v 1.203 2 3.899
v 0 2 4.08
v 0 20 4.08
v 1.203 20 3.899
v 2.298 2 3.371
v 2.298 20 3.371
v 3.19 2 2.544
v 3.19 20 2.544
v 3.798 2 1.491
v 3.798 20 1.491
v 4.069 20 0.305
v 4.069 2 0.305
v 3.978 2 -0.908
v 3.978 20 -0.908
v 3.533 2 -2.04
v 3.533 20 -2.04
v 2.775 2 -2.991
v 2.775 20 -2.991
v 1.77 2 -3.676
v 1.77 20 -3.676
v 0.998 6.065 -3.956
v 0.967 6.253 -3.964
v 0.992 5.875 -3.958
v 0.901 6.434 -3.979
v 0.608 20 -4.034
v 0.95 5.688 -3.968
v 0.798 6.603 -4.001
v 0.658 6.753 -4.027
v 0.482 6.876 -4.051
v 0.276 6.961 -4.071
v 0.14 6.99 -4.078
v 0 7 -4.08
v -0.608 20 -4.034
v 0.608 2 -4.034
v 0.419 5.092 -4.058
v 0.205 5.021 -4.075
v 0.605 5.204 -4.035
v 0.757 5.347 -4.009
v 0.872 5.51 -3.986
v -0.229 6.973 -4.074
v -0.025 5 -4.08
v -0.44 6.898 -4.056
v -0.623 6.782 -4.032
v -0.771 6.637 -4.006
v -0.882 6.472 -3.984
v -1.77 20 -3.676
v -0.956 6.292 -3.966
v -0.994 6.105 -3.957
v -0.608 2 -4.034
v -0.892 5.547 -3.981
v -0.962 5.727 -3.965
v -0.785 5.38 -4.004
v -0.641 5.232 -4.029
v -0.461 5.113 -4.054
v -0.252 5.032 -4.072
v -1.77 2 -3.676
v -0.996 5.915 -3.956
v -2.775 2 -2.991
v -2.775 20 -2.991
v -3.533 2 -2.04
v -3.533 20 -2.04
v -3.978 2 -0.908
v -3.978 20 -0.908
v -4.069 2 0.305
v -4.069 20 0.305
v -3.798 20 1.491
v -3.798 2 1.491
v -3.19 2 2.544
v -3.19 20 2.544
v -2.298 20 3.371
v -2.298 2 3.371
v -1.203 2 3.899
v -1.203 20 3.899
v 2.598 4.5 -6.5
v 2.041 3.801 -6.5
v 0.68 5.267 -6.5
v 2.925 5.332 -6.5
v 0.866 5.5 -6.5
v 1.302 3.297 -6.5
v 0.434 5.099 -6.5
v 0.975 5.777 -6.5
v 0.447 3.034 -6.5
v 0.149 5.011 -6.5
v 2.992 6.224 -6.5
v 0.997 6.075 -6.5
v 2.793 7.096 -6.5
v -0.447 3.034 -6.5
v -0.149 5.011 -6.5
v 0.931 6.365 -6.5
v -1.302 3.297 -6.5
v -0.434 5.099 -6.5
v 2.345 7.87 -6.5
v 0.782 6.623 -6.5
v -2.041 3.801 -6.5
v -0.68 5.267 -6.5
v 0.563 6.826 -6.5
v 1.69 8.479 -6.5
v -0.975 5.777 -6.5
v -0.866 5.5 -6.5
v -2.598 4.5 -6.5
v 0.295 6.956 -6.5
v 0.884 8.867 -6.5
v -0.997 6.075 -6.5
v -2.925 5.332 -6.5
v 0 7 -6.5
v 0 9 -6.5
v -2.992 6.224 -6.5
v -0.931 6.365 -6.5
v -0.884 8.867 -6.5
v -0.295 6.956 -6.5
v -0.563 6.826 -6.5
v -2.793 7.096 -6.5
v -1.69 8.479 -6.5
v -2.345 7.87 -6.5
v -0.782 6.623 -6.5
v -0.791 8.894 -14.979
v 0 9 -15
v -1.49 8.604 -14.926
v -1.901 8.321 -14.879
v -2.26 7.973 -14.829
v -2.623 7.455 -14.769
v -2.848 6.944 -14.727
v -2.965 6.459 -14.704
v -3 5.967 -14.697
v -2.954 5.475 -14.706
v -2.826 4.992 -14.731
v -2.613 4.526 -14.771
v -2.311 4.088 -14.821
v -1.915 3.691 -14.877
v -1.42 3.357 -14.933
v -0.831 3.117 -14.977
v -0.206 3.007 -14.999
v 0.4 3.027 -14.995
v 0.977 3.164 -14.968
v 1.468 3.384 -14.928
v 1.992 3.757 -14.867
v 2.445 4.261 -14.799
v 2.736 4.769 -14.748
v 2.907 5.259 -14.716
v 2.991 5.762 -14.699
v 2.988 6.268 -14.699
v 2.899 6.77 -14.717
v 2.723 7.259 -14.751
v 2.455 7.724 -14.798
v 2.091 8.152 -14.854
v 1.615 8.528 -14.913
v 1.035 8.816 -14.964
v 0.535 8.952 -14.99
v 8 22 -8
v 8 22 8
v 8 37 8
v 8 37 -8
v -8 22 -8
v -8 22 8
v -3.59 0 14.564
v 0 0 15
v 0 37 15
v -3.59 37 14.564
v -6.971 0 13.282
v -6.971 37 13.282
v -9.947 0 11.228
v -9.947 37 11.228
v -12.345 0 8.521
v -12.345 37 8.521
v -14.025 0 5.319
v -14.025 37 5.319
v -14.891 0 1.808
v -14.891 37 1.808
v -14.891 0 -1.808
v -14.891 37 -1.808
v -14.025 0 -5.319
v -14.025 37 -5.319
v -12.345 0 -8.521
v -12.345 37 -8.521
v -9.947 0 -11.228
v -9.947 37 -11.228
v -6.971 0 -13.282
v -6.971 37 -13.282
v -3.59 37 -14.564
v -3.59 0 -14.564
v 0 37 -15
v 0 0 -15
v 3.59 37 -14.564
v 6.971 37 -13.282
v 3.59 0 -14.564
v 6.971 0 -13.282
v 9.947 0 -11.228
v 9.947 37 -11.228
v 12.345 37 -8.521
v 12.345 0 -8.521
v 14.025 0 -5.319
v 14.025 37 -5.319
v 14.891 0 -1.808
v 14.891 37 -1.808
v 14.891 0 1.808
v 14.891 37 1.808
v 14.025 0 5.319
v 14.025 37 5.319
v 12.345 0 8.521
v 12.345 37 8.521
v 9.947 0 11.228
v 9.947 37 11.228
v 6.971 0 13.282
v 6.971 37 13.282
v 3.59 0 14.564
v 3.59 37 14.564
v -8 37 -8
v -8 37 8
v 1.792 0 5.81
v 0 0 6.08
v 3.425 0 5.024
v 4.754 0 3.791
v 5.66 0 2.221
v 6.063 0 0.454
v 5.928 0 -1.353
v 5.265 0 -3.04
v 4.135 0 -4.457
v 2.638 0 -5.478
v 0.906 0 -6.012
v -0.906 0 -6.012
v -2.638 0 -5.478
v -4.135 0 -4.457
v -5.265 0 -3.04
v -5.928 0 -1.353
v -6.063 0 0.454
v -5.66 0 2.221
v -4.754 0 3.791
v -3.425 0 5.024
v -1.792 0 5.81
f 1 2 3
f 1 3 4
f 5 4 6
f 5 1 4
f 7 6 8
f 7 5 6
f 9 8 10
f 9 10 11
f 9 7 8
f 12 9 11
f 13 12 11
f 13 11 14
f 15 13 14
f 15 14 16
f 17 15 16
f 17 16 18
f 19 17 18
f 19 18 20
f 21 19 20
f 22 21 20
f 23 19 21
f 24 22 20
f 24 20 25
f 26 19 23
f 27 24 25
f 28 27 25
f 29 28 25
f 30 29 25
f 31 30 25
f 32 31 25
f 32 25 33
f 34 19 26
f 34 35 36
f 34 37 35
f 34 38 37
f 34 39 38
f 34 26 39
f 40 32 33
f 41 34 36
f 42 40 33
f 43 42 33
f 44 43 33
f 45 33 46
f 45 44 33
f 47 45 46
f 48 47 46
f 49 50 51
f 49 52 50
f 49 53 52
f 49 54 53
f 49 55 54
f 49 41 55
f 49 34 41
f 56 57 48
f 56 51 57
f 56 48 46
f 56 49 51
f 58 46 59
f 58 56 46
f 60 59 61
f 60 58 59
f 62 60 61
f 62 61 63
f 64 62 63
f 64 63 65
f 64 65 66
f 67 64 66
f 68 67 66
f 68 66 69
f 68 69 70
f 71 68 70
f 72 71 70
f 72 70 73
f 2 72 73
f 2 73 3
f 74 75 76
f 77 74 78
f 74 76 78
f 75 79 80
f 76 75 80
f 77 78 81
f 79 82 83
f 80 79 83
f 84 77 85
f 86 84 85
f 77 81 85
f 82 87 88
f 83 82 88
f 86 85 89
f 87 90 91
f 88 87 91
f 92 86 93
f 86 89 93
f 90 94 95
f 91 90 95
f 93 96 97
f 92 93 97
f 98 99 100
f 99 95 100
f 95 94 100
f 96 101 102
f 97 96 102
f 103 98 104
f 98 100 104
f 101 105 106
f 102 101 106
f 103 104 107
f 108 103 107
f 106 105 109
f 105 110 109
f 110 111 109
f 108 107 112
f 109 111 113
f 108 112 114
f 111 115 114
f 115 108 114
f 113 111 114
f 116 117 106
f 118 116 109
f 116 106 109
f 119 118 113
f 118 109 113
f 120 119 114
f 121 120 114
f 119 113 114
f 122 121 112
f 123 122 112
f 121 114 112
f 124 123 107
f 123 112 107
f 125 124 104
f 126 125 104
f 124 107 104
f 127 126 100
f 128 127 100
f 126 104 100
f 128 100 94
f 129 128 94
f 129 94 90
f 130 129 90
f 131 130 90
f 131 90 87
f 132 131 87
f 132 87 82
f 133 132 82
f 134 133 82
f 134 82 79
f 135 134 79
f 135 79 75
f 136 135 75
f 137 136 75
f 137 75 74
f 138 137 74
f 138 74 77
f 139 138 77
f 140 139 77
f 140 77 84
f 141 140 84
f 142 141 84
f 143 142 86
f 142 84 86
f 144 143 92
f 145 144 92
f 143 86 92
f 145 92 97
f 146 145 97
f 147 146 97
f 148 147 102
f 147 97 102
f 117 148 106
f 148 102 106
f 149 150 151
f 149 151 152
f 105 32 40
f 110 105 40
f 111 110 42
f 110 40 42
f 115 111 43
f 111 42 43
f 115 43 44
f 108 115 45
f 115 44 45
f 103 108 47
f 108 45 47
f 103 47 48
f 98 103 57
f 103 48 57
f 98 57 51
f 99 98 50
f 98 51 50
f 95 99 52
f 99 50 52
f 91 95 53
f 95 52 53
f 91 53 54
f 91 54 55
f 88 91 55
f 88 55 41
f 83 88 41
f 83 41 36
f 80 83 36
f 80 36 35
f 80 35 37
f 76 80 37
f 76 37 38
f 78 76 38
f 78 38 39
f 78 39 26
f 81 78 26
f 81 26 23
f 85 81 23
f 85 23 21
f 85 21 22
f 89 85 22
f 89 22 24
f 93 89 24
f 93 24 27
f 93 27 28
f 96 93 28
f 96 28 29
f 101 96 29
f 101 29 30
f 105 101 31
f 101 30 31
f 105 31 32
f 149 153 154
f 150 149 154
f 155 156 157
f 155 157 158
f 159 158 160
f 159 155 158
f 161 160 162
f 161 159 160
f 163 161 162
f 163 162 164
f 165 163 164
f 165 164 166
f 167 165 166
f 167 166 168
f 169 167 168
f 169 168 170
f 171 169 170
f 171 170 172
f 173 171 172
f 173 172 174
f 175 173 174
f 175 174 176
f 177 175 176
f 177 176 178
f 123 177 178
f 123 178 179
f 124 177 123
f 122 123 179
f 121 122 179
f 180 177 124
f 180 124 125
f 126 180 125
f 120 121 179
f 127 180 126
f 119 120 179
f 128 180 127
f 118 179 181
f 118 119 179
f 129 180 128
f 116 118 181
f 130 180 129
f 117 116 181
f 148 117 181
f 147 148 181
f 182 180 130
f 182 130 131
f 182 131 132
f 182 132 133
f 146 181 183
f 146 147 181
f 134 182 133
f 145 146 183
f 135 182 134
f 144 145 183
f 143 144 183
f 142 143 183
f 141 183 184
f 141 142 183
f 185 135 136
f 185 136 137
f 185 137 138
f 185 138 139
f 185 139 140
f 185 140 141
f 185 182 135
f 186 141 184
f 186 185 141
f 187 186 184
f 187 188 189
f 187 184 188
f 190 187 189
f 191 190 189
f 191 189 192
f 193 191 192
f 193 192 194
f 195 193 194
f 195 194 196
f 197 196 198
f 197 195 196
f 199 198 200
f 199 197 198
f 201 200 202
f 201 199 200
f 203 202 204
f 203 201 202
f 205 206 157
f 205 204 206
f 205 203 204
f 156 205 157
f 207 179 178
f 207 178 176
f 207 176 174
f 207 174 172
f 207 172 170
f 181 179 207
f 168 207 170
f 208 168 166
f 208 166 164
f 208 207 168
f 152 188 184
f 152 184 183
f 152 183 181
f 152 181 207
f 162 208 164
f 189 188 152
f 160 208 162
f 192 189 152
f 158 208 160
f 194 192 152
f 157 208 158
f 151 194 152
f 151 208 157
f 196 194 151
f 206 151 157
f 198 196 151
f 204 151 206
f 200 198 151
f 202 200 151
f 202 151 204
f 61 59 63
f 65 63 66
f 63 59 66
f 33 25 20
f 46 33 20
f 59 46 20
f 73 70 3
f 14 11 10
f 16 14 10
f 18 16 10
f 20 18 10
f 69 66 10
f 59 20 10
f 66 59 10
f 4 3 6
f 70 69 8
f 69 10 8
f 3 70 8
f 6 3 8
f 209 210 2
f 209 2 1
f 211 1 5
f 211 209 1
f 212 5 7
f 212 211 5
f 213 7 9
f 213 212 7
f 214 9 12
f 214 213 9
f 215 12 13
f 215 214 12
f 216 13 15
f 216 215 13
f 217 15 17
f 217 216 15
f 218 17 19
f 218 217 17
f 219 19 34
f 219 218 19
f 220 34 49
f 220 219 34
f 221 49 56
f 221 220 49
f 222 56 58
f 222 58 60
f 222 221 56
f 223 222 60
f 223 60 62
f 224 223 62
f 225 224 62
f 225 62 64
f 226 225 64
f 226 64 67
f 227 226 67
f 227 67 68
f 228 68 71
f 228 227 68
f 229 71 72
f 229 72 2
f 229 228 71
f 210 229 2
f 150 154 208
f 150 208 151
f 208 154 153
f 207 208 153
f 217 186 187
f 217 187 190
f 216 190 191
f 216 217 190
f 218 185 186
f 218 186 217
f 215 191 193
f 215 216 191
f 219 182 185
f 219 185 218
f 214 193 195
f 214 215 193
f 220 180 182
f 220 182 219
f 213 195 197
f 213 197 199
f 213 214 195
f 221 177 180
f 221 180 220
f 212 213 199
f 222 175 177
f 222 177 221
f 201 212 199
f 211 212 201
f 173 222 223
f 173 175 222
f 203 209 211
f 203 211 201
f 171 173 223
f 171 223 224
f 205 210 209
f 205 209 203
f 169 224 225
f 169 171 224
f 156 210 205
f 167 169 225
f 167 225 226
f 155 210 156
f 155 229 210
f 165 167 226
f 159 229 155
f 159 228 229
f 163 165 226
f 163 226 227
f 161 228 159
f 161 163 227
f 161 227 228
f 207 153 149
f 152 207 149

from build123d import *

# Parameters (mm, degrees)
SKETCH1_R           = 6.5
SKETCH1_R_2         = 4.08
BOSS_EXTRUDE1_DEPTH = 20
SKETCH2_R           = 15
BOSS_EXTRUDE2_DEPTH = 2
SKETCH3_R           = 15
SKETCH3_W           = 16
SKETCH3_H           = 16
BOSS_EXTRUDE3_DEPTH = 15
BOSS_EXTRUDE4_START = 20
SKETCH4_R           = 15
SKETCH4_R_2         = 6.5
BOSS_EXTRUDE4_DEPTH = 20
SKETCH6_R           = 1
CUT_EXTRUDE1_DEPTH  = 24
CUT_EXTRUDE2_START  = 10
SKETCH8_R           = 3
SKETCH8_R_2         = 1
CUT_EXTRUDE2_DEPTH  = 10
CHAMFER1_SIZE       = 2


with BuildPart() as part:
    # Sketch1 → Boss-Extrude1 (new body)
    with BuildSketch(Plane(origin=(0, 0, 0), x_dir=(1, 0, 0), z_dir=(0, 1, 0))):
        with Locations(Location((0, 0, 0), (0, 0, 270))):
            Circle(SKETCH1_R)
        with Locations(Location((0, 0, 0), (0, 0, 270))):
            Circle(SKETCH1_R_2, mode=Mode.SUBTRACT)
    extrude(amount=BOSS_EXTRUDE1_DEPTH)

    # Sketch2 → Boss-Extrude2 (add)
    with BuildSketch(Plane(origin=(0, 20, 0), x_dir=(1, 0, 0), z_dir=(0, 1, 0))):
        with Locations(Location((0, 0, 0), (0, 0, 270))):
            Circle(SKETCH2_R)
    extrude(amount=BOSS_EXTRUDE2_DEPTH)

    # Sketch3 → Boss-Extrude3 (add)
    with BuildSketch(Plane(origin=(0, 22, 0), x_dir=(1, 0, 0), z_dir=(0, 1, 0))):
        with Locations(Location((0, 0, 0), (0, 0, 270))):
            Circle(SKETCH3_R)
        Rectangle(SKETCH3_W, SKETCH3_H, mode=Mode.SUBTRACT)
    extrude(amount=BOSS_EXTRUDE3_DEPTH)

    # Sketch4 → Boss-Extrude4 (add)
    with BuildSketch(Plane.XZ.offset(-20).offset(BOSS_EXTRUDE4_START)):
        with Locations(Location((0, 0, 0), (0, 0, 90))):
            Circle(SKETCH4_R)
        Circle(SKETCH4_R_2, mode=Mode.SUBTRACT)
    extrude(amount=-BOSS_EXTRUDE4_DEPTH)

    # Sketch6 → Cut-Extrude1 (cut)
    with BuildSketch(Plane.XY):
        with Locations(Location((0, 6, 0), (0, 0, 90))):
            Circle(SKETCH6_R)
    extrude(amount=-CUT_EXTRUDE1_DEPTH, mode=Mode.SUBTRACT)

    # Sketch8 → Cut-Extrude2 (cut)
    with BuildSketch(Plane.XY.offset(-16.5).offset(CUT_EXTRUDE2_START)):
        with Locations(Location((0, 6, 0), (0, 0, 90))):
            Circle(SKETCH8_R)
        with Locations((0, 6)):
            Circle(SKETCH8_R_2, mode=Mode.SUBTRACT)
    extrude(amount=-CUT_EXTRUDE2_DEPTH, mode=Mode.SUBTRACT)

    # Chamfer1
    chamfer1_edges = [part.edges().sort_by_distance(p)[0] for p in [
        (0, 0, -4.08),
    ]]
    chamfer(chamfer1_edges, length=CHAMFER1_SIZE)


solid = part.part
